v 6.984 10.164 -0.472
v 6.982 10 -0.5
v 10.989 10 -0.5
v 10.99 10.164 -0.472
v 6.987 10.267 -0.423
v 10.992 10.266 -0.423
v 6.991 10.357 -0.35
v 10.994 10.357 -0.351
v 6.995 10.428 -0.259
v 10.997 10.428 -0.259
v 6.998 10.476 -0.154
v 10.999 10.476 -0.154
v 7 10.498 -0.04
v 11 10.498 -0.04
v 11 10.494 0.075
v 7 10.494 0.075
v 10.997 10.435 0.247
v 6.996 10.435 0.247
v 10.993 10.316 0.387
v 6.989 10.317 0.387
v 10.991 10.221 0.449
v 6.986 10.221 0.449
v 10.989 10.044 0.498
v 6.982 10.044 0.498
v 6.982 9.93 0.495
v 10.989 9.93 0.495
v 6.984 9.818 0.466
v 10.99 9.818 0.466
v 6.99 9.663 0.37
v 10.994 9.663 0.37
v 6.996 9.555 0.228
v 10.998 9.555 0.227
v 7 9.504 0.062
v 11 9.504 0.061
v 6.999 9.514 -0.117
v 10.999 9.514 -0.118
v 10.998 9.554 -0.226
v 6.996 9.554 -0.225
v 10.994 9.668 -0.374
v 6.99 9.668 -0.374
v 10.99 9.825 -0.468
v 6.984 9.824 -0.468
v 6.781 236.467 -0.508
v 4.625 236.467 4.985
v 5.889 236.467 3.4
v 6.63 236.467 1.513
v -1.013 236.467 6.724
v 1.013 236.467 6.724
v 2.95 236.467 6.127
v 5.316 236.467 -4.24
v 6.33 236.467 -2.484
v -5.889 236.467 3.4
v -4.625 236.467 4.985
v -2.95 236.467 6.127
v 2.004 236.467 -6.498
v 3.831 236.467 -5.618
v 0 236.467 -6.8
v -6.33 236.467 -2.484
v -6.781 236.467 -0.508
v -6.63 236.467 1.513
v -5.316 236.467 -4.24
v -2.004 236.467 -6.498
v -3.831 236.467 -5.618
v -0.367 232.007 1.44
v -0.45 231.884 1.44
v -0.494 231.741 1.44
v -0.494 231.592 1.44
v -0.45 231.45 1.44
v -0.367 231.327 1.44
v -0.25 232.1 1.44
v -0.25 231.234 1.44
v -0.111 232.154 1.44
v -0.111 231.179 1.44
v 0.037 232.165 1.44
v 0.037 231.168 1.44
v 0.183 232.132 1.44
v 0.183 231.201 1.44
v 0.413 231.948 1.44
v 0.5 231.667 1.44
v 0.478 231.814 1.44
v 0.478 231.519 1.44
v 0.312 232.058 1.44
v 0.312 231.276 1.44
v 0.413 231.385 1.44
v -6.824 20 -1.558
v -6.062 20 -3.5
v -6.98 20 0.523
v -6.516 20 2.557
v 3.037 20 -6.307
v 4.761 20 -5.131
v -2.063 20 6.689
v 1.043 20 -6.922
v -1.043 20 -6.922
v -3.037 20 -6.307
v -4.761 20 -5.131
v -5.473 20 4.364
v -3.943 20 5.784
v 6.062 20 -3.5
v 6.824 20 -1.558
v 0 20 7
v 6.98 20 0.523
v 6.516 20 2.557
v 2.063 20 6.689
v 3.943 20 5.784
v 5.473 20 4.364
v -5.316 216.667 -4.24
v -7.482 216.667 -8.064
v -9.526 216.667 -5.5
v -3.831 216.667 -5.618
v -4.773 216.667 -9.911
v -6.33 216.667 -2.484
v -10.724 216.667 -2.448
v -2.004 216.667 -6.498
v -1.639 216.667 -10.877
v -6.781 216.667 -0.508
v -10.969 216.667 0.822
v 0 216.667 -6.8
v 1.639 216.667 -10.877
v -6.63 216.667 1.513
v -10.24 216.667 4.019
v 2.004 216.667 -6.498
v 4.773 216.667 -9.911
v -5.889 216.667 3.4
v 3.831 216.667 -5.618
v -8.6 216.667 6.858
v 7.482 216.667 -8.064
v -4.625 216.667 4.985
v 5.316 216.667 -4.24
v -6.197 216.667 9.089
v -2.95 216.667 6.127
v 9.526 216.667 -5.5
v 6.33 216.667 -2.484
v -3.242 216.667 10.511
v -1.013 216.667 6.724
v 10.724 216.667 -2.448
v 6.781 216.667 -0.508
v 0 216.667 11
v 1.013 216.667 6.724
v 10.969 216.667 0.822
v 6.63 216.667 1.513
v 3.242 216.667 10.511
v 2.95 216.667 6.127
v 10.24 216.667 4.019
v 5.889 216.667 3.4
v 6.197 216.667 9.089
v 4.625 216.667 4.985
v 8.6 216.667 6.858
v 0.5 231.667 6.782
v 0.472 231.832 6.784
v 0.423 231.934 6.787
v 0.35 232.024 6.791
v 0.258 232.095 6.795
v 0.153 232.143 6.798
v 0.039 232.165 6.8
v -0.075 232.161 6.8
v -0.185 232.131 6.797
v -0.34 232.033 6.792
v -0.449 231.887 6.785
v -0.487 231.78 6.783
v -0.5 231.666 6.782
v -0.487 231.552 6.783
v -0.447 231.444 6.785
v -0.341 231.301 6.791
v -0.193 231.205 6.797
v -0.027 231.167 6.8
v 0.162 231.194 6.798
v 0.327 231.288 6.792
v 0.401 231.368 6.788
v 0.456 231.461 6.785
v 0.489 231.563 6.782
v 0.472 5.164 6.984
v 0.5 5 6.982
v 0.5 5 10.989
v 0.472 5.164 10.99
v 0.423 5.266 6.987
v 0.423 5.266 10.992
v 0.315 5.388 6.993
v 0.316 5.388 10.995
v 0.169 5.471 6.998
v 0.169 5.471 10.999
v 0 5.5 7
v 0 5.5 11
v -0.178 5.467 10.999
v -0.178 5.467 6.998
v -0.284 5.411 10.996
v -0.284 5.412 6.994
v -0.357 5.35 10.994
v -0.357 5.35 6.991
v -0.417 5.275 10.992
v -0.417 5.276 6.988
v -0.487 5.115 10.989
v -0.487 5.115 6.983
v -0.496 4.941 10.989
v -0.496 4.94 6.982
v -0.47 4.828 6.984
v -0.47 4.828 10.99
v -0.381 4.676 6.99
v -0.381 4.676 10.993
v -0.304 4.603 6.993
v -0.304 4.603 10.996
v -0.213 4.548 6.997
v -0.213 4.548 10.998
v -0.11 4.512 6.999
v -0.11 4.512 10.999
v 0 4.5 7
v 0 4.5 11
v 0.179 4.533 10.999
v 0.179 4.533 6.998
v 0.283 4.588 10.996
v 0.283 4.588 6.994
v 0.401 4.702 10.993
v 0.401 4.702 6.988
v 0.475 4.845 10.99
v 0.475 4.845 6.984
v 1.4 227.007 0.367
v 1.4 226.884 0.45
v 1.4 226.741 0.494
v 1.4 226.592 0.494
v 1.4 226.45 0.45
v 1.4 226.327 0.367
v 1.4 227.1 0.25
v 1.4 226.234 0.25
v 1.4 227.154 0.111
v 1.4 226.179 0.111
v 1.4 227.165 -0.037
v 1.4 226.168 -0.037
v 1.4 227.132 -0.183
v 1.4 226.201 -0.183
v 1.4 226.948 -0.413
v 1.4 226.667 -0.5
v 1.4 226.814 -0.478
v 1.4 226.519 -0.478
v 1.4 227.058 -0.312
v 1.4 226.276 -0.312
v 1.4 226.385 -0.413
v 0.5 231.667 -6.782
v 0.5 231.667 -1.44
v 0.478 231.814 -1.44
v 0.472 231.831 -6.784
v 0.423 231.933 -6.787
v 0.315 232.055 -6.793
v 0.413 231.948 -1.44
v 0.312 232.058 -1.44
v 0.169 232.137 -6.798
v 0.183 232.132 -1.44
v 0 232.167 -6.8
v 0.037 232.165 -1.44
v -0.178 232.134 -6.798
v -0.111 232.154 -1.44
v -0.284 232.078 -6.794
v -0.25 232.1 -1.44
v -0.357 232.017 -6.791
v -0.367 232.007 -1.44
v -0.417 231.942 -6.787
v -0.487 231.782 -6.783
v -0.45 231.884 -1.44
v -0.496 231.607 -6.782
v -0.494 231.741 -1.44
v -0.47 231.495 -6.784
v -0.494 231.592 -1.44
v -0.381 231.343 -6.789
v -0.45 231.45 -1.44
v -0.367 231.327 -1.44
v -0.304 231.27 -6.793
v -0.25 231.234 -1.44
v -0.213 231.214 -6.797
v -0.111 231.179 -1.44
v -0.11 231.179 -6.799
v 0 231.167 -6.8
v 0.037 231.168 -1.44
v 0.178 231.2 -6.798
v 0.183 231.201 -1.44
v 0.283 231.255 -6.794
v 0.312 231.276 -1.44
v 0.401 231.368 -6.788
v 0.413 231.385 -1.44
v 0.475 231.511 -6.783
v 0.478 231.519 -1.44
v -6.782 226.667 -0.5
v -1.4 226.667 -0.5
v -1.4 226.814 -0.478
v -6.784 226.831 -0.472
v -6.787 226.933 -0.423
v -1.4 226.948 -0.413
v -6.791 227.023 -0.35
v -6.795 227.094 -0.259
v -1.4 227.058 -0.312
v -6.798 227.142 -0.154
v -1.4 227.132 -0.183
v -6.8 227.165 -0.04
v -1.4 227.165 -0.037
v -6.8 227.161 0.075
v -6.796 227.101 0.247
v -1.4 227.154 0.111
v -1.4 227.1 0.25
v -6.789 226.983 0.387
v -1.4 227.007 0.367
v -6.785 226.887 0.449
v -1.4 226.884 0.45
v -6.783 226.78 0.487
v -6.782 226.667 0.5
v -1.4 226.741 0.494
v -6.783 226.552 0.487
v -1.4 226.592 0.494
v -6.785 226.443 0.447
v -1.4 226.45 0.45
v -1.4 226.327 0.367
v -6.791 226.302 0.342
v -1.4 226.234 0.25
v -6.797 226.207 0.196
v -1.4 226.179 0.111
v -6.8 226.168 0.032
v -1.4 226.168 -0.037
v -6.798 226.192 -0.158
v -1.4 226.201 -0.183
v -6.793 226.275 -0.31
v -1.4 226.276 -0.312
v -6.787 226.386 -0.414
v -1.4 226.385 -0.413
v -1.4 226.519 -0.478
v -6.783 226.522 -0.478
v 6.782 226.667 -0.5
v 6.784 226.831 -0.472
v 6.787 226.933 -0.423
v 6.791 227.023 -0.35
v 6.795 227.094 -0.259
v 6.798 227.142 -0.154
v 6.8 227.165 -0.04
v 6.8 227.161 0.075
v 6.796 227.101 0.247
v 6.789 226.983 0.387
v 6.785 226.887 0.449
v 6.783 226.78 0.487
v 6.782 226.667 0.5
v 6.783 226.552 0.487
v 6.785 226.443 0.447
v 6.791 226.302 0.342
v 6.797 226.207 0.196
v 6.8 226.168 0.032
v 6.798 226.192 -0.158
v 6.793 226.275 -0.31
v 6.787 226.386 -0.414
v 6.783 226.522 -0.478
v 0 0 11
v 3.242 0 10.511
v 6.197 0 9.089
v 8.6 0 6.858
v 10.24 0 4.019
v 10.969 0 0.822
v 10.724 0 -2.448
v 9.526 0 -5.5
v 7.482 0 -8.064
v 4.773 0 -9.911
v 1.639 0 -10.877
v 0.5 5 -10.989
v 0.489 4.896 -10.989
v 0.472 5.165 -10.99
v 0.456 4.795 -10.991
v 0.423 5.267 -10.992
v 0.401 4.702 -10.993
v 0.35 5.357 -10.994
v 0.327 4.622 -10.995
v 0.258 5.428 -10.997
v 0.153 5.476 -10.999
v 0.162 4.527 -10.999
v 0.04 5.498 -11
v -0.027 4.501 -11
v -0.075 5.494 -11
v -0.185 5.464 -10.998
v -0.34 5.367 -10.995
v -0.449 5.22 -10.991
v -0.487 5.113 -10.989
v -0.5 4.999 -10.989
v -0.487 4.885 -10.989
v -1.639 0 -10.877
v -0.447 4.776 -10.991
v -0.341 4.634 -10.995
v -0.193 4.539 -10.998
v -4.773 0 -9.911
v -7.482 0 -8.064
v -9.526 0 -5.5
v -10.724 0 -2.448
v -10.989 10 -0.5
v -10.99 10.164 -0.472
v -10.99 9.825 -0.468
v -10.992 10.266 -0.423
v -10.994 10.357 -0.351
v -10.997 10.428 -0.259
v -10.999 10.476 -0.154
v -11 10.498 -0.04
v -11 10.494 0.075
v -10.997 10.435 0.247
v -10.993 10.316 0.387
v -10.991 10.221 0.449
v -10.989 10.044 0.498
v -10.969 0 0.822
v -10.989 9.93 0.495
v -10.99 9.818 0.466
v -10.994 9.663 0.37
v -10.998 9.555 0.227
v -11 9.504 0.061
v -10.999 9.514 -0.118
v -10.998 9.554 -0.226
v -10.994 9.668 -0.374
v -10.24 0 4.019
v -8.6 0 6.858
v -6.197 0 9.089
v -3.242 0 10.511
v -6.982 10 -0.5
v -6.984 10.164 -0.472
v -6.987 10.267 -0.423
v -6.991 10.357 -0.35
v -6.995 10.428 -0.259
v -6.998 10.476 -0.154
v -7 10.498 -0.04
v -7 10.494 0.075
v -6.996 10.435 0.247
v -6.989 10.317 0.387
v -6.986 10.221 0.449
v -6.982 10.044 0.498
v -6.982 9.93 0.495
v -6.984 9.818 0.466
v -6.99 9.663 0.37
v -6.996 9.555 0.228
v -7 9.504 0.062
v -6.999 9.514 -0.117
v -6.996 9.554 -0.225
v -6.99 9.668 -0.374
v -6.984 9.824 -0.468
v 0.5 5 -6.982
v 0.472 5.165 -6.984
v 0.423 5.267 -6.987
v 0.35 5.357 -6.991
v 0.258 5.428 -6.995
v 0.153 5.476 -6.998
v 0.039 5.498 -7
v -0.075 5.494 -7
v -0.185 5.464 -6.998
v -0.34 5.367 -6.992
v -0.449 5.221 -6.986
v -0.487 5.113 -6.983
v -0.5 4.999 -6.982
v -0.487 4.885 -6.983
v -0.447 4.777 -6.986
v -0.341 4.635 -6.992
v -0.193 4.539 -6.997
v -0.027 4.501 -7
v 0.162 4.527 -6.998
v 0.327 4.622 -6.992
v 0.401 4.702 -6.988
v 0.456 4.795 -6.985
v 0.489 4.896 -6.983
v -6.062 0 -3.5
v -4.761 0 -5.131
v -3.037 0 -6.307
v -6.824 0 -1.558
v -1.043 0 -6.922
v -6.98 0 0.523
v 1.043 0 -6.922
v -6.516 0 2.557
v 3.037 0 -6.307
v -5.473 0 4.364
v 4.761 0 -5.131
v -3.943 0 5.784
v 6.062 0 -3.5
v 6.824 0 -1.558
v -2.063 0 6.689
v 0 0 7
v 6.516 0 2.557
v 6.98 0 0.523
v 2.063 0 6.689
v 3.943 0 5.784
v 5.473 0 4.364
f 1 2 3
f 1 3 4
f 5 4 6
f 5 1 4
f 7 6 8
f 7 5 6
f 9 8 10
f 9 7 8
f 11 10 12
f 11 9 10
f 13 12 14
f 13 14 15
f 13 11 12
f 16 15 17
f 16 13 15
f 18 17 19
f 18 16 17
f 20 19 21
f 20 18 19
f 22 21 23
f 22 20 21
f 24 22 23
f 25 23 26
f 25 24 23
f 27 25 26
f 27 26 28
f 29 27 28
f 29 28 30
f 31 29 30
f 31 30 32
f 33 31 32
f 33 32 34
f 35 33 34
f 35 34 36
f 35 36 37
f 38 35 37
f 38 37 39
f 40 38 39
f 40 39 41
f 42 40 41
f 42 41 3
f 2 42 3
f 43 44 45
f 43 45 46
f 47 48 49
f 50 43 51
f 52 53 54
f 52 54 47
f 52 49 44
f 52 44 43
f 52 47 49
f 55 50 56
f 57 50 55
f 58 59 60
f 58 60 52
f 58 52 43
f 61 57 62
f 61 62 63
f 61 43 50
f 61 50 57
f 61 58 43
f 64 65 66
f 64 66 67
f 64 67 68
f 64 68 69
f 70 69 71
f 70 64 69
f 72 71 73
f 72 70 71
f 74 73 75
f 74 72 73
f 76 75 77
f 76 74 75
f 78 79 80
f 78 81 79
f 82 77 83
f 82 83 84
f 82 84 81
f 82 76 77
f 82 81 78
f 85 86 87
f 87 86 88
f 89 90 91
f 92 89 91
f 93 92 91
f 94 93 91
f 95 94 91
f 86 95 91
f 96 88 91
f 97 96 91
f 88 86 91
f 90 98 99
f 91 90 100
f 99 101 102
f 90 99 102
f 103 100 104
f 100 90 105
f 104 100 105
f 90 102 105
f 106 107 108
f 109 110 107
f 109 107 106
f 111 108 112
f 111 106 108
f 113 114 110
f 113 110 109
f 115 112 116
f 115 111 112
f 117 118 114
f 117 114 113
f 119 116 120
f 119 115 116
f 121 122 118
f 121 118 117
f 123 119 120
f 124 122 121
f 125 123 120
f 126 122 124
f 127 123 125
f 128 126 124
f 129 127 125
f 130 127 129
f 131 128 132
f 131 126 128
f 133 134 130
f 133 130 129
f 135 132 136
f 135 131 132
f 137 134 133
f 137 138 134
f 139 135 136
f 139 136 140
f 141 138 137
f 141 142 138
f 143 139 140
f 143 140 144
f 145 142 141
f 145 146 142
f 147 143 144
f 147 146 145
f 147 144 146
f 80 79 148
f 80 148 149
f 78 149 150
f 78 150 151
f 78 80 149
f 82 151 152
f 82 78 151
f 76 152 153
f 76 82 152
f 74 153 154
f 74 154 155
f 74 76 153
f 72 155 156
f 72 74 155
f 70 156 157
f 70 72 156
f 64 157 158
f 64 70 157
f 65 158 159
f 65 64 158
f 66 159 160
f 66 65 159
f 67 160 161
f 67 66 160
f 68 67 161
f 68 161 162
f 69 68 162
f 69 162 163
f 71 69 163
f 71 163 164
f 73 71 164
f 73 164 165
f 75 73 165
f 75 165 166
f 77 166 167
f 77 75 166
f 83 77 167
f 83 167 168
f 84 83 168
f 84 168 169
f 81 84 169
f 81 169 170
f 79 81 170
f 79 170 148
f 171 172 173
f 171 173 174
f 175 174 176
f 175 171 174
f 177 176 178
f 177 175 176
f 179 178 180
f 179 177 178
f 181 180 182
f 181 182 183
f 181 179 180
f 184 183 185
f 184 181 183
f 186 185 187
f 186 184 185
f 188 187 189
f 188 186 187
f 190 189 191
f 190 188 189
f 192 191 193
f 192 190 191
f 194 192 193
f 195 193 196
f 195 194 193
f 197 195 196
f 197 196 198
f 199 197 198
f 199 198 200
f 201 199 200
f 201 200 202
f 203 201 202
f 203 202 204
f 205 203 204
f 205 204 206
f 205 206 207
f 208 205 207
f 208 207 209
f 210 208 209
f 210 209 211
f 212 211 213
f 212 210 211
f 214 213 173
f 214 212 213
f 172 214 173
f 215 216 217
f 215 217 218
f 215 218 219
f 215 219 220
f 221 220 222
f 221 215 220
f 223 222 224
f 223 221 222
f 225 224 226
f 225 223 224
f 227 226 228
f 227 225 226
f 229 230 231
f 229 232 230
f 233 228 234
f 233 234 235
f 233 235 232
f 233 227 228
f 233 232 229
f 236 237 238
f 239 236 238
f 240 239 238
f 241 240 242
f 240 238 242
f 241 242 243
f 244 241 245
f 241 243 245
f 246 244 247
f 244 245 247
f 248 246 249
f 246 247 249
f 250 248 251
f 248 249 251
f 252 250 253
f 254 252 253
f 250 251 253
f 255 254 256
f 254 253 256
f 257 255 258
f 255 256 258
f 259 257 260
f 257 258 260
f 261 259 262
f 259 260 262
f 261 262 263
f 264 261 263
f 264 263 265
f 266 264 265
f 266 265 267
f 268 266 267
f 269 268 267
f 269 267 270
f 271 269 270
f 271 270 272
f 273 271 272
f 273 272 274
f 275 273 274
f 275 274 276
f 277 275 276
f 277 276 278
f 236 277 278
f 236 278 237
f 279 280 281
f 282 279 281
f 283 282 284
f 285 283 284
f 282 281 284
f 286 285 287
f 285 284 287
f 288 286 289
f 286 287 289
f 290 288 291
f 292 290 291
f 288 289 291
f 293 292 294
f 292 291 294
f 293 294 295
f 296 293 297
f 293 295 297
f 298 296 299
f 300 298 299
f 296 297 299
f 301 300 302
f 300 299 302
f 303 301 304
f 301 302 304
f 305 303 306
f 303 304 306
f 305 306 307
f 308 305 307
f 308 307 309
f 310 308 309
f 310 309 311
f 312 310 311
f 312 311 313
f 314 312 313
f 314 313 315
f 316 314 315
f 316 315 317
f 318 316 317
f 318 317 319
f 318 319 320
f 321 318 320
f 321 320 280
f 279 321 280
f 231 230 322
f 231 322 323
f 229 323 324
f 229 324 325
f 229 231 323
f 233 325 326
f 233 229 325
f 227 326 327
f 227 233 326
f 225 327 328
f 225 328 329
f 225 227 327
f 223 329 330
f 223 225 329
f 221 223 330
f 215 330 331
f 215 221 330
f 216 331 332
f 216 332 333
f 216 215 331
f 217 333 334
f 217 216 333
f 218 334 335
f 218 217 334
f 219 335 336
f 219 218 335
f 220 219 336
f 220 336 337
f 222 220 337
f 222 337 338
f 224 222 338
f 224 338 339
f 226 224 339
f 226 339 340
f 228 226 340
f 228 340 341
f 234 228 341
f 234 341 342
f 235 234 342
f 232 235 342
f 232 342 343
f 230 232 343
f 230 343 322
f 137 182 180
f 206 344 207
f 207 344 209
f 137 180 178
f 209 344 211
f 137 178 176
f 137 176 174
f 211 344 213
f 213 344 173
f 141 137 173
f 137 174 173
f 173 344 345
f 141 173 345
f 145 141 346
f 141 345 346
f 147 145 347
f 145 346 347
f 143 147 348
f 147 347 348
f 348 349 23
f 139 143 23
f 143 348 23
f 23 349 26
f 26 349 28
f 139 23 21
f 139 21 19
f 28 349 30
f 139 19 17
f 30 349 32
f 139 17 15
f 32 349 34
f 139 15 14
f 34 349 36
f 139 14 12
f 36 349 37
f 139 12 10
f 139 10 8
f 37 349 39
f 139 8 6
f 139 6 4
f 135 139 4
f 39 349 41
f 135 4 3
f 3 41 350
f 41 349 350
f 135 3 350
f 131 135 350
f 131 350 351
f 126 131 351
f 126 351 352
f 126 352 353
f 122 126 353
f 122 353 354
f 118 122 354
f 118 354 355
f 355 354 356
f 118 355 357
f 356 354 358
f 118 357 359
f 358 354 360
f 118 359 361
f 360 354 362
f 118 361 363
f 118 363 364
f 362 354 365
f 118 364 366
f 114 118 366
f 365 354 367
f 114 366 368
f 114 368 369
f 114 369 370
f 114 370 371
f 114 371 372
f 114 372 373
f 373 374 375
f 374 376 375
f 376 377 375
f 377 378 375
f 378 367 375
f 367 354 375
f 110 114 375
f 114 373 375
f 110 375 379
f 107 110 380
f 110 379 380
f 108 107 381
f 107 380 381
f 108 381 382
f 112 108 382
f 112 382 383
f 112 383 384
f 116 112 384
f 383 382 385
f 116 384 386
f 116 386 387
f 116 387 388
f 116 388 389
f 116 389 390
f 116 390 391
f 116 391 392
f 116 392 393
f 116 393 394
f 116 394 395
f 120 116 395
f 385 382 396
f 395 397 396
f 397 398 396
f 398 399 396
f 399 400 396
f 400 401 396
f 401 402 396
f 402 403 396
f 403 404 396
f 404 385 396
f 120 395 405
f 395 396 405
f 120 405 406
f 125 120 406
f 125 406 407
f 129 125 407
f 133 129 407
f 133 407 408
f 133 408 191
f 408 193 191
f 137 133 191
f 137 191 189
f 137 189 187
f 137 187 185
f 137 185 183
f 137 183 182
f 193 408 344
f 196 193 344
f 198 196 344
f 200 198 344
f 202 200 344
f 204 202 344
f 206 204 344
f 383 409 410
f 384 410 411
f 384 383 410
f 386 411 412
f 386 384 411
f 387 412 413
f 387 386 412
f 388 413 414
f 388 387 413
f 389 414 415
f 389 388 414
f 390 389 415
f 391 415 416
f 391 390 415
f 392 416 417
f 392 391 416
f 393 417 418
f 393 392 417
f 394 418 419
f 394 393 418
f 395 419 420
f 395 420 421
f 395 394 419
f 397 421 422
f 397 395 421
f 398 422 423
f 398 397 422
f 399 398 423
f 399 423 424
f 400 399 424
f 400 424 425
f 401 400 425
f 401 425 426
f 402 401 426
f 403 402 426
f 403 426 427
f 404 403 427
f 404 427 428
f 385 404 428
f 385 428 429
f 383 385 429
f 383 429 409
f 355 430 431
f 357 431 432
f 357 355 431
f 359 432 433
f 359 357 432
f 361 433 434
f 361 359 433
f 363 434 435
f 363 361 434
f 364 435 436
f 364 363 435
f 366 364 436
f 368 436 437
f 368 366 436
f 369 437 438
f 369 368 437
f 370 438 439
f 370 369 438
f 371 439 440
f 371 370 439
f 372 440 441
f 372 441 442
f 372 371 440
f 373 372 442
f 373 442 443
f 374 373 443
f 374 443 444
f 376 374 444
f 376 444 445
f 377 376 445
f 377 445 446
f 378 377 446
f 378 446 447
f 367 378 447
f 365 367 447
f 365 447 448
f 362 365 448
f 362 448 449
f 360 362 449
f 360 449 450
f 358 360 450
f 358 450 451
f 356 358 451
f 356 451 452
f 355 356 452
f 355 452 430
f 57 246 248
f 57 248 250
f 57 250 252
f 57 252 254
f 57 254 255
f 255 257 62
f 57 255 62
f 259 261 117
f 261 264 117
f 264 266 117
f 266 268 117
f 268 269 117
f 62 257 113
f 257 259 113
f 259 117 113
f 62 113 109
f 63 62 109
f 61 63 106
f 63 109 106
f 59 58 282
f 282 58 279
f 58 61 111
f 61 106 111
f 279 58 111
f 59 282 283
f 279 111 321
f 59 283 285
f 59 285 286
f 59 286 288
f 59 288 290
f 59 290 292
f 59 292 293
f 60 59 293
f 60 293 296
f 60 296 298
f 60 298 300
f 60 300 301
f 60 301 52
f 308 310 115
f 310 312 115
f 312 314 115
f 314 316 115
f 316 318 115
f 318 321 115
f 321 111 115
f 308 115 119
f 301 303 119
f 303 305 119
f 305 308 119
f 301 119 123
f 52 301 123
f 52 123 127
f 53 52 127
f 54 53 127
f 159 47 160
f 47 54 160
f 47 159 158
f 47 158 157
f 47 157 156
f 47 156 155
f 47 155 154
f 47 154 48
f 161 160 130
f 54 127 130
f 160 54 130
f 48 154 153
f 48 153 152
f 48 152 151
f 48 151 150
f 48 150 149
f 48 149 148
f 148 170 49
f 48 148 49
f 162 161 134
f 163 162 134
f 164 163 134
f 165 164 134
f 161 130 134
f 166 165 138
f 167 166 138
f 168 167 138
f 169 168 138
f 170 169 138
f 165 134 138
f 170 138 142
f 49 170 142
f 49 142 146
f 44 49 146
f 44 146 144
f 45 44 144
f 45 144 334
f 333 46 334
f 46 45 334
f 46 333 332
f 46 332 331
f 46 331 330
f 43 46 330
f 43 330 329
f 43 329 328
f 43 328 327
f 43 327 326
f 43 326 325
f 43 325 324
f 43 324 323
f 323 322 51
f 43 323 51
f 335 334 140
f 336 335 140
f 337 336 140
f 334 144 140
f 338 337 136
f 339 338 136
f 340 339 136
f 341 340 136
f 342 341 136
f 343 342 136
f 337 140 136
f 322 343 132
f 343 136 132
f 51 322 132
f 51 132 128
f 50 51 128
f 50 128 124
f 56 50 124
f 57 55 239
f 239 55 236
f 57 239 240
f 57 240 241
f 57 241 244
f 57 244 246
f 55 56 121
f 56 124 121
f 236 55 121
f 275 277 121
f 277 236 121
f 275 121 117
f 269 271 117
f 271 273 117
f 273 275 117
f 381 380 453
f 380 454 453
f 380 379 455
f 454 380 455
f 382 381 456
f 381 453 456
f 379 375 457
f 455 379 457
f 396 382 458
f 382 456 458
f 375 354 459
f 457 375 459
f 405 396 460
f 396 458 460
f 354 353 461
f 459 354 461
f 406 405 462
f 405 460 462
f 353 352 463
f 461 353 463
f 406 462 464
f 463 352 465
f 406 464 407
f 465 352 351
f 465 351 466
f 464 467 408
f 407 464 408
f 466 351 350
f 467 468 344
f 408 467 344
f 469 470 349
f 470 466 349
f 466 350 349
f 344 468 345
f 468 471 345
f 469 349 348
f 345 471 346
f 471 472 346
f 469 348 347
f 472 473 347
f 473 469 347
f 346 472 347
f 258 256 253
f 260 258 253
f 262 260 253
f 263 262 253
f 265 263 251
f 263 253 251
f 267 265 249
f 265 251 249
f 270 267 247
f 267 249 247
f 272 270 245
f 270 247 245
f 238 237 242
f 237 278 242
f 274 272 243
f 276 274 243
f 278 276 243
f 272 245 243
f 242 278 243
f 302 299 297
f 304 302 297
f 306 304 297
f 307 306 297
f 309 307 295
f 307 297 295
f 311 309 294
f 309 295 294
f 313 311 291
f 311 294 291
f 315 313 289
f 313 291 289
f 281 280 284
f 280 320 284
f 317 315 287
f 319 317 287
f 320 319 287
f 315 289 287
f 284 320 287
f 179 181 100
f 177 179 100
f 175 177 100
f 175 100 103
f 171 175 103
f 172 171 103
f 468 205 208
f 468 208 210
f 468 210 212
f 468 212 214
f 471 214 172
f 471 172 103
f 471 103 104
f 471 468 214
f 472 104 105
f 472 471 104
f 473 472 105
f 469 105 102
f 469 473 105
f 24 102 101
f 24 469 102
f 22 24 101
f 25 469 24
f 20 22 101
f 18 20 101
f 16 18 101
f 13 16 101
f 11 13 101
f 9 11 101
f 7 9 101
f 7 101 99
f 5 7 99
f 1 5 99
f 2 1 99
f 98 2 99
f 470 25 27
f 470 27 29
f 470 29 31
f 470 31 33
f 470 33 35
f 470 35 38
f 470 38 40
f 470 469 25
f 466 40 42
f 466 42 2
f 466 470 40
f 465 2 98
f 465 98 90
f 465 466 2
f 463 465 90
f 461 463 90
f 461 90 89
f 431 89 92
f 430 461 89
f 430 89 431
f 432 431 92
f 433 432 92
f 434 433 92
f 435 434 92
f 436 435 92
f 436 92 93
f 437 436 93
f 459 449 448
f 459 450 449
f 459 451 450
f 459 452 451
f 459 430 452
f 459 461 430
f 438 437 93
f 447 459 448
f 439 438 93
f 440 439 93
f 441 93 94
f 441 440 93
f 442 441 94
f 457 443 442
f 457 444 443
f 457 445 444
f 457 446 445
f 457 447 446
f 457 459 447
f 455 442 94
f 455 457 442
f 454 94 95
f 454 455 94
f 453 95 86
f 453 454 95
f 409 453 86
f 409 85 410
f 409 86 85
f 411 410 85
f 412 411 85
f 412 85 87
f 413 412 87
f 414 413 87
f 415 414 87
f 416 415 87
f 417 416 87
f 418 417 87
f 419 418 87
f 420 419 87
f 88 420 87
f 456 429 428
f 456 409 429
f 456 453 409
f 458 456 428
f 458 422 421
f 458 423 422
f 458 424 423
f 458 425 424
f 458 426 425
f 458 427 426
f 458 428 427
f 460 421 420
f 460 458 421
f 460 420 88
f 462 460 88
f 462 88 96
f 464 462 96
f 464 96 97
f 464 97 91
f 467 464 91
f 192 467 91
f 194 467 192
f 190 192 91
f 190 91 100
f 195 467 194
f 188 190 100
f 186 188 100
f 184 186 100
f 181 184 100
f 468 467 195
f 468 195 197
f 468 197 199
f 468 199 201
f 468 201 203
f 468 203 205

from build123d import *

# Parameters (mm, degrees)
SKETCH1_R               = 11
BOSS_EXTRUDE1_DEPTH     = 216.66667
BOSS_EXTRUDE2_START     = 216.66667
SKETCH2_R               = 6.8
BOSS_EXTRUDE2_DEPTH     = 19.8
CUT_EXTRUDE1_START      = -1.44
SKETCH3_R               = 0.5
CUT_EXTRUDE1_DEPTH      = 9
CUT_EXTRUDE2_START      = -1.4
SKETCH4_R               = 0.5
CUT_EXTRUDE2_DEPTH      = 9
SKETCH6_R               = 7
CUT_EXTRUDE3_DEPTH      = 20
CUT_EXTRUDE4_DEPTH      = 237.977817671
CUT_EXTRUDE4_DEPTH_BACK = 237.977817671
SKETCH7_R               = 0.5
CUT_EXTRUDE5_DEPTH      = 237.97781768
CUT_EXTRUDE5_DEPTH_BACK = 237.97781768
SKETCH10_R              = 0.5


with BuildPart() as part:
    # Sketch1 → Boss-Extrude1 (new body)
    with BuildSketch(Plane(origin=(0, 0, 0), x_dir=(1, 0, 0), z_dir=(0, 1, 0))):
        with Locations(Location((0, 0, 0), (0, 0, 270))):
            Circle(SKETCH1_R)
    extrude(amount=BOSS_EXTRUDE1_DEPTH)

    # Sketch2 → Boss-Extrude2 (add)
    with BuildSketch(Plane(origin=(0, 0, 0), x_dir=(1, 0, 0), z_dir=(0, 1, 0)).offset(BOSS_EXTRUDE2_START)):
        with Locations(Location((0, 0, 0), (0, 0, 90))):
            Circle(SKETCH2_R)
    extrude(amount=BOSS_EXTRUDE2_DEPTH)

    # Sketch3 → Cut-Extrude1 (cut)
    with BuildSketch(Plane.XY.offset(CUT_EXTRUDE1_START)):
        with Locations((0, 231.66667)):
            Circle(SKETCH3_R)
    cut_extrude1 = extrude(amount=-CUT_EXTRUDE1_DEPTH, mode=Mode.SUBTRACT)

    # Mirror1: Cut-Extrude1 across plane
    add(cut_extrude1.mirror(Plane.XY), mode=Mode.SUBTRACT)

    # Sketch4 → Cut-Extrude2 (cut)
    with BuildSketch(Plane(origin=(0, 0, 0), x_dir=(0, 0, -1), z_dir=(1, 0, 0)).offset(CUT_EXTRUDE2_START)):
        with Locations((0, 226.66667)):
            Circle(SKETCH4_R)
    cut_extrude2 = extrude(amount=-CUT_EXTRUDE2_DEPTH, mode=Mode.SUBTRACT)

    # Mirror2: Cut-Extrude2 across plane
    add(cut_extrude2.mirror(Plane(origin=(0, 0, 0), x_dir=(0, 0, 1), z_dir=(1, 0, 0))), mode=Mode.SUBTRACT)

    # Sketch6 → Cut-Extrude3 (cut)
    with BuildSketch(Plane(origin=(0, 0, 0), x_dir=(1, 0, 0), z_dir=(0, 1, 0))):
        with Locations(Location((0, 0, 0), (0, 0, 270))):
            Circle(SKETCH6_R)
    extrude(amount=CUT_EXTRUDE3_DEPTH, mode=Mode.SUBTRACT)

    # Sketch7 → Cut-Extrude4 (cut, two sides: drawn at the far end of the back side and taken through both)
    with BuildSketch(Plane(origin=(0, 0, 0), x_dir=(0, 0, -1), z_dir=(1, 0, 0)).offset(-CUT_EXTRUDE4_DEPTH_BACK)):
        with Locations((0, 10)):
            Circle(SKETCH7_R)
    extrude(amount=CUT_EXTRUDE4_DEPTH + CUT_EXTRUDE4_DEPTH_BACK, mode=Mode.SUBTRACT)

    # Sketch10 → Cut-Extrude5 (cut, two sides: drawn at the far end of the back side and taken through both)
    with BuildSketch(Plane.XY.offset(-CUT_EXTRUDE5_DEPTH_BACK)):
        with Locations((0, 5)):
            Circle(SKETCH10_R)
    extrude(amount=CUT_EXTRUDE5_DEPTH + CUT_EXTRUDE5_DEPTH_BACK, mode=Mode.SUBTRACT)


solid = part.part
